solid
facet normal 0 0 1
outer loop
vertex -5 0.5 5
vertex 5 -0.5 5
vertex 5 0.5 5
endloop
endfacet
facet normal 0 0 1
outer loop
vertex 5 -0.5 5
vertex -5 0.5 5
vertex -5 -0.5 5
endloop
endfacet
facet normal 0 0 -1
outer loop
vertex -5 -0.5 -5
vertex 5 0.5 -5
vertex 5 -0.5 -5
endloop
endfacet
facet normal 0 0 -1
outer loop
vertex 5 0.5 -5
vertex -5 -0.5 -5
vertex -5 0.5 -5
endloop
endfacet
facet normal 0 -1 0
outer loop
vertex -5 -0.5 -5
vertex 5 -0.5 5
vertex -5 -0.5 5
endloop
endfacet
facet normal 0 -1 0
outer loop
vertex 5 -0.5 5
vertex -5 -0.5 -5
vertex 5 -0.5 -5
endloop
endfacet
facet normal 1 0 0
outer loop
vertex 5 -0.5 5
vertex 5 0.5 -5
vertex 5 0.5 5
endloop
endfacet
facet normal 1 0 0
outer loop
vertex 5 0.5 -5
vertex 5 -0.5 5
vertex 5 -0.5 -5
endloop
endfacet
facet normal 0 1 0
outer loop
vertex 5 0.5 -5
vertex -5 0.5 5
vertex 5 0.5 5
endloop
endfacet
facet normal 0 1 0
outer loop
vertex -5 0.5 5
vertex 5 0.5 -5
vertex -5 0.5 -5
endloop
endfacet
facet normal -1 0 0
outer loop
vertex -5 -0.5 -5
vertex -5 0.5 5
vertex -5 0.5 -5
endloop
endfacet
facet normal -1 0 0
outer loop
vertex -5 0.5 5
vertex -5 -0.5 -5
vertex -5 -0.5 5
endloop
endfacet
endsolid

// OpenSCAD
scale(v=[10, 1, 0.1]) {
    cube(size=[1, 1, 100], center=true);
};
